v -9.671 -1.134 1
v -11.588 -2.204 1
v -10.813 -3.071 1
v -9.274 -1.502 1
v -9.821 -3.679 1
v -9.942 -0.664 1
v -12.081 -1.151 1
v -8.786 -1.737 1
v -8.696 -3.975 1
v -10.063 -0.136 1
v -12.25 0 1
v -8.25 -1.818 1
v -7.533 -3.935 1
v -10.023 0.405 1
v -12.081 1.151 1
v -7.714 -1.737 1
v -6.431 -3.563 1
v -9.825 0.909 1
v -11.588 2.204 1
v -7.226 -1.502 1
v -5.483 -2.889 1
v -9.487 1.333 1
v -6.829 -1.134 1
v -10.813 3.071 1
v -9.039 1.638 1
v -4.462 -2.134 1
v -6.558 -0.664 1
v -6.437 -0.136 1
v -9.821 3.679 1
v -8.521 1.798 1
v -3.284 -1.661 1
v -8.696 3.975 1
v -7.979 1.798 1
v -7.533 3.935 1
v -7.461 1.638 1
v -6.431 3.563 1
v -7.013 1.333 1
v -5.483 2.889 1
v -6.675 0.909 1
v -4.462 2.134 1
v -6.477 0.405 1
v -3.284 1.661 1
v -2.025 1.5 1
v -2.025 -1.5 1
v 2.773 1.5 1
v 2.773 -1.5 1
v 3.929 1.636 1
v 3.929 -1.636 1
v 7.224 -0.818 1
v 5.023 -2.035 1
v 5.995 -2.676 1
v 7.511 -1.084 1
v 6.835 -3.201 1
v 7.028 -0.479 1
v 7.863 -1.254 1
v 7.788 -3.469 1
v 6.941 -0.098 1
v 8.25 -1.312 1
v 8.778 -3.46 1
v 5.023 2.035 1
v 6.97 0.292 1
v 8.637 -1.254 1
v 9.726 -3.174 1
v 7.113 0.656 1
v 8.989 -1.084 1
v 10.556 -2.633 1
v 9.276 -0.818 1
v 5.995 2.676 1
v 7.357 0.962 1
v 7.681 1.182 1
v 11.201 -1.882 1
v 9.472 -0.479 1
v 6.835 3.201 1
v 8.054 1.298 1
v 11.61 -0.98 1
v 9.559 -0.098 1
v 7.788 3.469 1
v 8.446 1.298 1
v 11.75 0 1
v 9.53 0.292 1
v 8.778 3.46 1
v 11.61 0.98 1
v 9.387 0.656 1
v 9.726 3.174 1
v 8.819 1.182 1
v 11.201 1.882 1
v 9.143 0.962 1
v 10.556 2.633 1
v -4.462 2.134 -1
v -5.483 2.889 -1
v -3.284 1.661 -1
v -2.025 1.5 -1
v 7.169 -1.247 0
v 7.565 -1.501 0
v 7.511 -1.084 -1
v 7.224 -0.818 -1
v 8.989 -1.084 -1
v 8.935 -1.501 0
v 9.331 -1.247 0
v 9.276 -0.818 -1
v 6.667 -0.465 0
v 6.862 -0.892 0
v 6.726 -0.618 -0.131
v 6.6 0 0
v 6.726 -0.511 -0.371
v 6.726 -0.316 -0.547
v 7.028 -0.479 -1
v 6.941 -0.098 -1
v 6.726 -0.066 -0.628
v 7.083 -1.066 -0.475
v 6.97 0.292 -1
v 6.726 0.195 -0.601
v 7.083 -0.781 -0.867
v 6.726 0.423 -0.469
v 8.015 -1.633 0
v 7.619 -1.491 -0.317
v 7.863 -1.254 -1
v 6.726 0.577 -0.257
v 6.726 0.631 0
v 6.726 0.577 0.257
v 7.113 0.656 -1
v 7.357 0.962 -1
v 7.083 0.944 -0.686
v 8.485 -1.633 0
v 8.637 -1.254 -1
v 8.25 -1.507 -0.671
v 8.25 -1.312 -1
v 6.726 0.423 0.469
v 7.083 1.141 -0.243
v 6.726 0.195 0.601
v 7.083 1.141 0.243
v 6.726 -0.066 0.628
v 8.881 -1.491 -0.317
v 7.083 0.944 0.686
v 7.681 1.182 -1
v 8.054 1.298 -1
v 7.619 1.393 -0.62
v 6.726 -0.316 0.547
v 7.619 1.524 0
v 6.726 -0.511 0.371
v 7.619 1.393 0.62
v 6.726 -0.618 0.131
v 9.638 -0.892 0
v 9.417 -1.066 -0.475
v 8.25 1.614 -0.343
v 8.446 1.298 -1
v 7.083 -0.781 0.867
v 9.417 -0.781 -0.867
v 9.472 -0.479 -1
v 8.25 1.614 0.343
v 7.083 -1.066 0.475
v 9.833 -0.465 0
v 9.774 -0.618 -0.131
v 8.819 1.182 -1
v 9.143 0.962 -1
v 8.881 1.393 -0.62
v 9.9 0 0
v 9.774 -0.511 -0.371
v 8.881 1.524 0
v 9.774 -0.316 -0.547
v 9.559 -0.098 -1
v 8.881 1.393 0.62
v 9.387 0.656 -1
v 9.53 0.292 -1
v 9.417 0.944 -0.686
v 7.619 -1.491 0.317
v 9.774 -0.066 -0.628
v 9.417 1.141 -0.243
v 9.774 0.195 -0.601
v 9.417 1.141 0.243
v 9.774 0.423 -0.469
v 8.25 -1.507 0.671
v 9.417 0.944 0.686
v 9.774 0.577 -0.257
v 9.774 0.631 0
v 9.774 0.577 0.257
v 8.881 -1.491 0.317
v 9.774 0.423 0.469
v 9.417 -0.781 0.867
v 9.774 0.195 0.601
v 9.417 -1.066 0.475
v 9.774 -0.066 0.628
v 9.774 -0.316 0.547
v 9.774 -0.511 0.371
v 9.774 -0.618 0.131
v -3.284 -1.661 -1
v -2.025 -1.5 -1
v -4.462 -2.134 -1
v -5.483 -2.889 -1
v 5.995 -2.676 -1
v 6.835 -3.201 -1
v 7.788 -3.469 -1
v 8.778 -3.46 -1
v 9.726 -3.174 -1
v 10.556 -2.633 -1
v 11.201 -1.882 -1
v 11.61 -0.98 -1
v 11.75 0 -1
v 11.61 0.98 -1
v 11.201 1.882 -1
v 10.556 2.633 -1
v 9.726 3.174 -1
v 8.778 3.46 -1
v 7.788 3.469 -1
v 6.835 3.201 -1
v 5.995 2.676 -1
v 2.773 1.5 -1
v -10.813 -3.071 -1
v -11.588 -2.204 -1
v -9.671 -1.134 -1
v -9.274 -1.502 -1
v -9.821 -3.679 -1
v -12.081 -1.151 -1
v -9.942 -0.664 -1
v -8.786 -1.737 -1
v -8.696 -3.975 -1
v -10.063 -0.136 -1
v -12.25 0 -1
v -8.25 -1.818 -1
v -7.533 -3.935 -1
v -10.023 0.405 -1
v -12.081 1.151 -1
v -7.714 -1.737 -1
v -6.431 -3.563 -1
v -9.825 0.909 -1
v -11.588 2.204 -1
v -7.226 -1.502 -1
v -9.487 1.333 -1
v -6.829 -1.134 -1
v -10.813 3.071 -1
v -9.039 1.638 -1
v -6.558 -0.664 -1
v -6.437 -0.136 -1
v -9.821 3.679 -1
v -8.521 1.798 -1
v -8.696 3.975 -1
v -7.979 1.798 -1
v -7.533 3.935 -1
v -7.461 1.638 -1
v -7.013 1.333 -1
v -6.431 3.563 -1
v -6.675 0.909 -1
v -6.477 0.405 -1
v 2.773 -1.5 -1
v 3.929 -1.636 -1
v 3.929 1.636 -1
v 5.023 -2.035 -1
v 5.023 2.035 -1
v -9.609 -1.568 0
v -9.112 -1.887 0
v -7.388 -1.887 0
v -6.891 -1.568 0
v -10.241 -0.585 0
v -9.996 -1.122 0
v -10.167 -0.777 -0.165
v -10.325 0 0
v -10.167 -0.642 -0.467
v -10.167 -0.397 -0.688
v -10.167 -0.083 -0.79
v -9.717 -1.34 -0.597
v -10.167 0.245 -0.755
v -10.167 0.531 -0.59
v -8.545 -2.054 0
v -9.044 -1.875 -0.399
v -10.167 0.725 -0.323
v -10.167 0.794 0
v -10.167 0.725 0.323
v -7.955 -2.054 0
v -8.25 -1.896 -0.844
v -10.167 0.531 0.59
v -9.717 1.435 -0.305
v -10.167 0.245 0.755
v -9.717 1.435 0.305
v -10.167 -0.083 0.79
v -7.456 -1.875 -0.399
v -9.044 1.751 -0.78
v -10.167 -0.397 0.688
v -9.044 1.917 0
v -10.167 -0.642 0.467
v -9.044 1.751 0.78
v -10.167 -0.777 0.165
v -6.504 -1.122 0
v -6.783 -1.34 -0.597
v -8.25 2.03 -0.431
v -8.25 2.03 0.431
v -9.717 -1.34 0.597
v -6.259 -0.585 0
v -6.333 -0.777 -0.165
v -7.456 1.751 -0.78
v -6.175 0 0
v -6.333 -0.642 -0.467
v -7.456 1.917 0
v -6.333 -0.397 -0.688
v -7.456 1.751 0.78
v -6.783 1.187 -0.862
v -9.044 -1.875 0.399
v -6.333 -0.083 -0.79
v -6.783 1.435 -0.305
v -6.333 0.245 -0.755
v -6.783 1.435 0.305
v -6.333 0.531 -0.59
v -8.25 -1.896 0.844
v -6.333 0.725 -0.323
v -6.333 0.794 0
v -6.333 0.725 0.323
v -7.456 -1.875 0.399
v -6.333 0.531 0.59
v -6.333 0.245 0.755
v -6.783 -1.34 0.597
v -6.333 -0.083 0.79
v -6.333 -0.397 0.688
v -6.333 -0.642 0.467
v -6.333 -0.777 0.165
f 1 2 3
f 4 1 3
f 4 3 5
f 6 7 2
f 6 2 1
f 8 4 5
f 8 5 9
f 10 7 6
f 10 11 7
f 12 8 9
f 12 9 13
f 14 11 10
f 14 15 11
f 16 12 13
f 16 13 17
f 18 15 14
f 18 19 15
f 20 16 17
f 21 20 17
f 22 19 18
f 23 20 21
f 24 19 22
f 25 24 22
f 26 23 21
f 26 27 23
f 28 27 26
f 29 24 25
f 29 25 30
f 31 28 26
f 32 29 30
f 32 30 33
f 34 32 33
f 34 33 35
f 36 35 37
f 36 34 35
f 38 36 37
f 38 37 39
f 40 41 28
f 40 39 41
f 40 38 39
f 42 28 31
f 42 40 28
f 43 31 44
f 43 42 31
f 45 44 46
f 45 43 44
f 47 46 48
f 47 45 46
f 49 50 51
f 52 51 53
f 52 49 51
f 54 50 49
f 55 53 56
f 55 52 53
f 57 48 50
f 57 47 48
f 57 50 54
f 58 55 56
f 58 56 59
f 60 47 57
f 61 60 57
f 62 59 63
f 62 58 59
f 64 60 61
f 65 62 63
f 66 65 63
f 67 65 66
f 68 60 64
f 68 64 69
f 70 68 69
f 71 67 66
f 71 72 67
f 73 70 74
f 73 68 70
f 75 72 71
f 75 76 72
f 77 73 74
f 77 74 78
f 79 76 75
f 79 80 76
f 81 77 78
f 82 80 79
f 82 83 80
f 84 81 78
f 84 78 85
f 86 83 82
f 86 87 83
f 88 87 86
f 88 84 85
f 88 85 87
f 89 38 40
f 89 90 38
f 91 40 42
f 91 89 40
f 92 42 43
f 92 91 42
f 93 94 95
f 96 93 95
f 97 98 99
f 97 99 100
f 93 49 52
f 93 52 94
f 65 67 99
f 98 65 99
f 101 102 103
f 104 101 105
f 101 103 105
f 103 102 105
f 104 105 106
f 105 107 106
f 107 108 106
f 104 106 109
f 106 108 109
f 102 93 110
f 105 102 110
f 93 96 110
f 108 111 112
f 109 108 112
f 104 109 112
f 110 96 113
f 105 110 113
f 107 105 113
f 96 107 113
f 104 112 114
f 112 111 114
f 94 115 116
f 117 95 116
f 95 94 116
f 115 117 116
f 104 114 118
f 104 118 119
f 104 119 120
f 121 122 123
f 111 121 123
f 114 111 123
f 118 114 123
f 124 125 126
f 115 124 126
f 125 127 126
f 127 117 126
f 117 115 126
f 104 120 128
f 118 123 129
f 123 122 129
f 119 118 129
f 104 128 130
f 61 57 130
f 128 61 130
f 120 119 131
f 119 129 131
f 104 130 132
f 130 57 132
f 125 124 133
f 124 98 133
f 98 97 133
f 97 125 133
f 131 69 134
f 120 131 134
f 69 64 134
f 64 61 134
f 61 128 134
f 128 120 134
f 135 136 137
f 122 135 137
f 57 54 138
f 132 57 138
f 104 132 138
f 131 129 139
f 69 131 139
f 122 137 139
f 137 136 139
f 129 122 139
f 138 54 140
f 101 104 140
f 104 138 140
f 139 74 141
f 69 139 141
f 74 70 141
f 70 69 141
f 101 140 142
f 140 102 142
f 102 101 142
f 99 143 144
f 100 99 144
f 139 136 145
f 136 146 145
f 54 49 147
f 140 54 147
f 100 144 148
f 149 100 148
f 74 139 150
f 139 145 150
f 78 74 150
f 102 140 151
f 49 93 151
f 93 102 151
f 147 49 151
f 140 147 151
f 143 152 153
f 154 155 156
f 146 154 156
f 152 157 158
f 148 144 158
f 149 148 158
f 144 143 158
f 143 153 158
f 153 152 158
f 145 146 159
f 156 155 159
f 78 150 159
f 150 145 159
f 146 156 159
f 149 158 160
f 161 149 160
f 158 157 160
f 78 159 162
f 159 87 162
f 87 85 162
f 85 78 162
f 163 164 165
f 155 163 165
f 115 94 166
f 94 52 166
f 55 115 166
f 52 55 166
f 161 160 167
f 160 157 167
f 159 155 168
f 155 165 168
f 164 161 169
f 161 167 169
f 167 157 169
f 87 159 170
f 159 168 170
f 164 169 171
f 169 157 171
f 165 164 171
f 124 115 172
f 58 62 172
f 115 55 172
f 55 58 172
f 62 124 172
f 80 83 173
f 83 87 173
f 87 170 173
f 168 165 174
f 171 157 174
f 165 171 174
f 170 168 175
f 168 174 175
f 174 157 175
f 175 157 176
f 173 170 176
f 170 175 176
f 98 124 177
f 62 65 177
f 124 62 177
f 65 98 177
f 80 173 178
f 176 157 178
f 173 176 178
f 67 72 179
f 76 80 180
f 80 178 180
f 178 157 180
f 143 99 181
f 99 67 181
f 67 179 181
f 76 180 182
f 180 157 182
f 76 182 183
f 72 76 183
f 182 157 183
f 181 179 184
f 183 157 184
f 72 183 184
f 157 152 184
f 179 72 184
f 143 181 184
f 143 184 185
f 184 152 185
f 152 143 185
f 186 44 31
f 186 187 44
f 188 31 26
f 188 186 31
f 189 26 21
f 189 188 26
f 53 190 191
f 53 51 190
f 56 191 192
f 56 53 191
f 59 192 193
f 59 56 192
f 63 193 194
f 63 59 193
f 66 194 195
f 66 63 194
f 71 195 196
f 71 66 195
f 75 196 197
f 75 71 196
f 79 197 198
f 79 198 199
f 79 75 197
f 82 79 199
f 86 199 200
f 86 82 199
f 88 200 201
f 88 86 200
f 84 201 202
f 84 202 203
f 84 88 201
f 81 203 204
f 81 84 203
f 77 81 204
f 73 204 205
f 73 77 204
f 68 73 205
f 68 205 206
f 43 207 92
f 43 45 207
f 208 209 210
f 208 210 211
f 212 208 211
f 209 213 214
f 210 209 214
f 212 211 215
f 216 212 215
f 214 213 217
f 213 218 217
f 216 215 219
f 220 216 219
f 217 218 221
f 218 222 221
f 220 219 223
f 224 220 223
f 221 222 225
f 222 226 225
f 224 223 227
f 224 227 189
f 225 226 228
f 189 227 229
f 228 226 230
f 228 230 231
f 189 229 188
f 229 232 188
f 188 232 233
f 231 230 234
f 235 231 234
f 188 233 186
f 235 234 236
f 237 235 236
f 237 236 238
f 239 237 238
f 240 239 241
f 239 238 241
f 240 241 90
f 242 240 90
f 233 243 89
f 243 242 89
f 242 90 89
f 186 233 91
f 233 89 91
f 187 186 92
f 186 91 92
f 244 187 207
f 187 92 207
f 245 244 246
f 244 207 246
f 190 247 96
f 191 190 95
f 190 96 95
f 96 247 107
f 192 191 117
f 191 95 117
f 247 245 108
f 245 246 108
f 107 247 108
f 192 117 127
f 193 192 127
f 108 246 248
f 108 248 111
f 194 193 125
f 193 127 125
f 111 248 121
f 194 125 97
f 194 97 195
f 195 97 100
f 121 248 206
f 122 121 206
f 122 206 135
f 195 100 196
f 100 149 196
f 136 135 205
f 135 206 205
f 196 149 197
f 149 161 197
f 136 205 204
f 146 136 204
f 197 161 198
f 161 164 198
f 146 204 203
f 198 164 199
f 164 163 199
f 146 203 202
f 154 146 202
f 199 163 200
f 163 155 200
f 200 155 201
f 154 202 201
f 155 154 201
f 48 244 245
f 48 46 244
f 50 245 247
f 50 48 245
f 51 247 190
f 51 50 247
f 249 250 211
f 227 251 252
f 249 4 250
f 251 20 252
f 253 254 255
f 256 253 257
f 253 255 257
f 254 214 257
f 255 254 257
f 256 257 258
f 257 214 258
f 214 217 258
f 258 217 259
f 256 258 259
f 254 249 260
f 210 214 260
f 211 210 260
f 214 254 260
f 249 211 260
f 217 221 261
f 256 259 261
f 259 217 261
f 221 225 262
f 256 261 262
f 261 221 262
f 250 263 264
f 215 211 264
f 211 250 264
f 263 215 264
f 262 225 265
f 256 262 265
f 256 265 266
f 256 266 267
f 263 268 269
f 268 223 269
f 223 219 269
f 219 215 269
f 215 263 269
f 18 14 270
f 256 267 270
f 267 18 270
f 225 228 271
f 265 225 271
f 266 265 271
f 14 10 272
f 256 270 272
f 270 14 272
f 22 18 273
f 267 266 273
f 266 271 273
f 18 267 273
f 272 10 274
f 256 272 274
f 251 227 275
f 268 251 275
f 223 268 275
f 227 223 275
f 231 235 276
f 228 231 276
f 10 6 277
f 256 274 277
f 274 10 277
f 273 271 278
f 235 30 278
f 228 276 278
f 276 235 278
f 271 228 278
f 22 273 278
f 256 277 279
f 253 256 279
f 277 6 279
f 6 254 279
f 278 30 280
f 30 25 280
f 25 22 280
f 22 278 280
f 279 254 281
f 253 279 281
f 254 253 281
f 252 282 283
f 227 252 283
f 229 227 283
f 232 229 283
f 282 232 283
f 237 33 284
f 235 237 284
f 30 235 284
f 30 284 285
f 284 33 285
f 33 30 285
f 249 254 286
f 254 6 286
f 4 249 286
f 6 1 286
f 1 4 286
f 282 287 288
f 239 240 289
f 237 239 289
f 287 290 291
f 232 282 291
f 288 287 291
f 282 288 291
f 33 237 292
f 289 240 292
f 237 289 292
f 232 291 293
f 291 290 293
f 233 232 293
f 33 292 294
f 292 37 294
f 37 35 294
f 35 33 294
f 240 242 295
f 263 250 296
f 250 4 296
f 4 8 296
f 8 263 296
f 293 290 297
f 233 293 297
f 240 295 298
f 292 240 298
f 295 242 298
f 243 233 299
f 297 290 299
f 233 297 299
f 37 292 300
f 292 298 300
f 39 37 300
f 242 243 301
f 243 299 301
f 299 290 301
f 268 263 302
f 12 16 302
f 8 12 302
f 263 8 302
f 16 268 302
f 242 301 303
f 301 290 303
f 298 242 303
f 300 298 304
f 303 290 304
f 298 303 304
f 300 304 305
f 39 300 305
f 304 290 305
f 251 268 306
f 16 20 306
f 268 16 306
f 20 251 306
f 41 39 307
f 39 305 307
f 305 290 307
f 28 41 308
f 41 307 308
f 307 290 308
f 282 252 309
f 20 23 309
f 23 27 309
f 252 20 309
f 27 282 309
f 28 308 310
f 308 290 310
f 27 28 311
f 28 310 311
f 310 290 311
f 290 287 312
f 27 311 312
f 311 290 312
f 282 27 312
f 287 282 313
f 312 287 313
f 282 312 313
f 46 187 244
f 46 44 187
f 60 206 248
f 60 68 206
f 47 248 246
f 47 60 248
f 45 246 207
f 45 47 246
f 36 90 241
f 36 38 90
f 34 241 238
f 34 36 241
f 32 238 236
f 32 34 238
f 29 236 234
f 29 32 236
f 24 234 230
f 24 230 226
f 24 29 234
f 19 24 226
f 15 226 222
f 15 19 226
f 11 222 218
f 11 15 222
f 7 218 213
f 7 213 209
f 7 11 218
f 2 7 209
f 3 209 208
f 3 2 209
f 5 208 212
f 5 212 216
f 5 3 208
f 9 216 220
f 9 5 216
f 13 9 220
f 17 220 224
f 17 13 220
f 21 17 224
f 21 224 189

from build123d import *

# Parameters (mm, degrees)
F1_DEPTH = 1
F3_R     = 5


with BuildPart() as f1:
    # F0 (on Top) → F1 (new body, symmetric)
    with BuildSketch(Plane.XY):
        with BuildLine():
            Line((-4.541901, -1.5), (5.087722, -1.5))
            ThreePointArc((5.087722, -1.5), (11.75, 0), (5.087722, 1.5))
            Line((5.087722, 1.5), (-4.541901, 1.5))
            ThreePointArc((-4.541901, 1.5), (-12.25, 0), (-4.541901, -1.5))
        make_face()
        with BuildLine():
            ThreePointArc((-6.175, 0), (-8.25, -2.075), (-10.325, 0))
            Line((-10.325, 0), (-6.175, 0))
        make_face(mode=Mode.SUBTRACT)
        with BuildLine():
            ThreePointArc((9.9, 0), (8.25, -1.65), (6.6, 0))
            Line((6.6, 0), (9.9, 0))
        make_face(mode=Mode.SUBTRACT)
        with BuildLine():
            Line((-6.175, 0), (-10.325, 0))
            ThreePointArc((-10.325, 0), (-8.25, -2.075), (-6.175, 0))
        make_face()
        with BuildLine():
            Line((9.9, 0), (6.6, 0))
            ThreePointArc((6.6, 0), (8.25, -1.65), (9.9, 0))
        make_face()
    extrude(amount=F1_DEPTH, both=True)

    # F0 (on Top) → F2 (revolve, cut)
    with BuildSketch(Plane.XY):
        with BuildLine():
            Line((-6.175, 0), (-10.325, 0))
            ThreePointArc((-10.325, 0), (-8.25, -2.075), (-6.175, 0))
        make_face()
        with BuildLine():
            Line((9.9, 0), (6.6, 0))
            ThreePointArc((6.6, 0), (8.25, -1.65), (9.9, 0))
        make_face()
    revolve(axis=Axis((3.561865, 0, 0), (1, 0, 0)), mode=Mode.SUBTRACT)

    # F3
    f3_edges = [f1.edges().sort_by_distance(p)[0] for p in [
        (-4.541901, 1.5, 0),
        (5.087722, 1.5, 0),
        (-4.541901, -1.5, 0),
        (5.087722, -1.5, 0),
    ]]
    fillet(f3_edges, radius=F3_R)


solid = f1.part
